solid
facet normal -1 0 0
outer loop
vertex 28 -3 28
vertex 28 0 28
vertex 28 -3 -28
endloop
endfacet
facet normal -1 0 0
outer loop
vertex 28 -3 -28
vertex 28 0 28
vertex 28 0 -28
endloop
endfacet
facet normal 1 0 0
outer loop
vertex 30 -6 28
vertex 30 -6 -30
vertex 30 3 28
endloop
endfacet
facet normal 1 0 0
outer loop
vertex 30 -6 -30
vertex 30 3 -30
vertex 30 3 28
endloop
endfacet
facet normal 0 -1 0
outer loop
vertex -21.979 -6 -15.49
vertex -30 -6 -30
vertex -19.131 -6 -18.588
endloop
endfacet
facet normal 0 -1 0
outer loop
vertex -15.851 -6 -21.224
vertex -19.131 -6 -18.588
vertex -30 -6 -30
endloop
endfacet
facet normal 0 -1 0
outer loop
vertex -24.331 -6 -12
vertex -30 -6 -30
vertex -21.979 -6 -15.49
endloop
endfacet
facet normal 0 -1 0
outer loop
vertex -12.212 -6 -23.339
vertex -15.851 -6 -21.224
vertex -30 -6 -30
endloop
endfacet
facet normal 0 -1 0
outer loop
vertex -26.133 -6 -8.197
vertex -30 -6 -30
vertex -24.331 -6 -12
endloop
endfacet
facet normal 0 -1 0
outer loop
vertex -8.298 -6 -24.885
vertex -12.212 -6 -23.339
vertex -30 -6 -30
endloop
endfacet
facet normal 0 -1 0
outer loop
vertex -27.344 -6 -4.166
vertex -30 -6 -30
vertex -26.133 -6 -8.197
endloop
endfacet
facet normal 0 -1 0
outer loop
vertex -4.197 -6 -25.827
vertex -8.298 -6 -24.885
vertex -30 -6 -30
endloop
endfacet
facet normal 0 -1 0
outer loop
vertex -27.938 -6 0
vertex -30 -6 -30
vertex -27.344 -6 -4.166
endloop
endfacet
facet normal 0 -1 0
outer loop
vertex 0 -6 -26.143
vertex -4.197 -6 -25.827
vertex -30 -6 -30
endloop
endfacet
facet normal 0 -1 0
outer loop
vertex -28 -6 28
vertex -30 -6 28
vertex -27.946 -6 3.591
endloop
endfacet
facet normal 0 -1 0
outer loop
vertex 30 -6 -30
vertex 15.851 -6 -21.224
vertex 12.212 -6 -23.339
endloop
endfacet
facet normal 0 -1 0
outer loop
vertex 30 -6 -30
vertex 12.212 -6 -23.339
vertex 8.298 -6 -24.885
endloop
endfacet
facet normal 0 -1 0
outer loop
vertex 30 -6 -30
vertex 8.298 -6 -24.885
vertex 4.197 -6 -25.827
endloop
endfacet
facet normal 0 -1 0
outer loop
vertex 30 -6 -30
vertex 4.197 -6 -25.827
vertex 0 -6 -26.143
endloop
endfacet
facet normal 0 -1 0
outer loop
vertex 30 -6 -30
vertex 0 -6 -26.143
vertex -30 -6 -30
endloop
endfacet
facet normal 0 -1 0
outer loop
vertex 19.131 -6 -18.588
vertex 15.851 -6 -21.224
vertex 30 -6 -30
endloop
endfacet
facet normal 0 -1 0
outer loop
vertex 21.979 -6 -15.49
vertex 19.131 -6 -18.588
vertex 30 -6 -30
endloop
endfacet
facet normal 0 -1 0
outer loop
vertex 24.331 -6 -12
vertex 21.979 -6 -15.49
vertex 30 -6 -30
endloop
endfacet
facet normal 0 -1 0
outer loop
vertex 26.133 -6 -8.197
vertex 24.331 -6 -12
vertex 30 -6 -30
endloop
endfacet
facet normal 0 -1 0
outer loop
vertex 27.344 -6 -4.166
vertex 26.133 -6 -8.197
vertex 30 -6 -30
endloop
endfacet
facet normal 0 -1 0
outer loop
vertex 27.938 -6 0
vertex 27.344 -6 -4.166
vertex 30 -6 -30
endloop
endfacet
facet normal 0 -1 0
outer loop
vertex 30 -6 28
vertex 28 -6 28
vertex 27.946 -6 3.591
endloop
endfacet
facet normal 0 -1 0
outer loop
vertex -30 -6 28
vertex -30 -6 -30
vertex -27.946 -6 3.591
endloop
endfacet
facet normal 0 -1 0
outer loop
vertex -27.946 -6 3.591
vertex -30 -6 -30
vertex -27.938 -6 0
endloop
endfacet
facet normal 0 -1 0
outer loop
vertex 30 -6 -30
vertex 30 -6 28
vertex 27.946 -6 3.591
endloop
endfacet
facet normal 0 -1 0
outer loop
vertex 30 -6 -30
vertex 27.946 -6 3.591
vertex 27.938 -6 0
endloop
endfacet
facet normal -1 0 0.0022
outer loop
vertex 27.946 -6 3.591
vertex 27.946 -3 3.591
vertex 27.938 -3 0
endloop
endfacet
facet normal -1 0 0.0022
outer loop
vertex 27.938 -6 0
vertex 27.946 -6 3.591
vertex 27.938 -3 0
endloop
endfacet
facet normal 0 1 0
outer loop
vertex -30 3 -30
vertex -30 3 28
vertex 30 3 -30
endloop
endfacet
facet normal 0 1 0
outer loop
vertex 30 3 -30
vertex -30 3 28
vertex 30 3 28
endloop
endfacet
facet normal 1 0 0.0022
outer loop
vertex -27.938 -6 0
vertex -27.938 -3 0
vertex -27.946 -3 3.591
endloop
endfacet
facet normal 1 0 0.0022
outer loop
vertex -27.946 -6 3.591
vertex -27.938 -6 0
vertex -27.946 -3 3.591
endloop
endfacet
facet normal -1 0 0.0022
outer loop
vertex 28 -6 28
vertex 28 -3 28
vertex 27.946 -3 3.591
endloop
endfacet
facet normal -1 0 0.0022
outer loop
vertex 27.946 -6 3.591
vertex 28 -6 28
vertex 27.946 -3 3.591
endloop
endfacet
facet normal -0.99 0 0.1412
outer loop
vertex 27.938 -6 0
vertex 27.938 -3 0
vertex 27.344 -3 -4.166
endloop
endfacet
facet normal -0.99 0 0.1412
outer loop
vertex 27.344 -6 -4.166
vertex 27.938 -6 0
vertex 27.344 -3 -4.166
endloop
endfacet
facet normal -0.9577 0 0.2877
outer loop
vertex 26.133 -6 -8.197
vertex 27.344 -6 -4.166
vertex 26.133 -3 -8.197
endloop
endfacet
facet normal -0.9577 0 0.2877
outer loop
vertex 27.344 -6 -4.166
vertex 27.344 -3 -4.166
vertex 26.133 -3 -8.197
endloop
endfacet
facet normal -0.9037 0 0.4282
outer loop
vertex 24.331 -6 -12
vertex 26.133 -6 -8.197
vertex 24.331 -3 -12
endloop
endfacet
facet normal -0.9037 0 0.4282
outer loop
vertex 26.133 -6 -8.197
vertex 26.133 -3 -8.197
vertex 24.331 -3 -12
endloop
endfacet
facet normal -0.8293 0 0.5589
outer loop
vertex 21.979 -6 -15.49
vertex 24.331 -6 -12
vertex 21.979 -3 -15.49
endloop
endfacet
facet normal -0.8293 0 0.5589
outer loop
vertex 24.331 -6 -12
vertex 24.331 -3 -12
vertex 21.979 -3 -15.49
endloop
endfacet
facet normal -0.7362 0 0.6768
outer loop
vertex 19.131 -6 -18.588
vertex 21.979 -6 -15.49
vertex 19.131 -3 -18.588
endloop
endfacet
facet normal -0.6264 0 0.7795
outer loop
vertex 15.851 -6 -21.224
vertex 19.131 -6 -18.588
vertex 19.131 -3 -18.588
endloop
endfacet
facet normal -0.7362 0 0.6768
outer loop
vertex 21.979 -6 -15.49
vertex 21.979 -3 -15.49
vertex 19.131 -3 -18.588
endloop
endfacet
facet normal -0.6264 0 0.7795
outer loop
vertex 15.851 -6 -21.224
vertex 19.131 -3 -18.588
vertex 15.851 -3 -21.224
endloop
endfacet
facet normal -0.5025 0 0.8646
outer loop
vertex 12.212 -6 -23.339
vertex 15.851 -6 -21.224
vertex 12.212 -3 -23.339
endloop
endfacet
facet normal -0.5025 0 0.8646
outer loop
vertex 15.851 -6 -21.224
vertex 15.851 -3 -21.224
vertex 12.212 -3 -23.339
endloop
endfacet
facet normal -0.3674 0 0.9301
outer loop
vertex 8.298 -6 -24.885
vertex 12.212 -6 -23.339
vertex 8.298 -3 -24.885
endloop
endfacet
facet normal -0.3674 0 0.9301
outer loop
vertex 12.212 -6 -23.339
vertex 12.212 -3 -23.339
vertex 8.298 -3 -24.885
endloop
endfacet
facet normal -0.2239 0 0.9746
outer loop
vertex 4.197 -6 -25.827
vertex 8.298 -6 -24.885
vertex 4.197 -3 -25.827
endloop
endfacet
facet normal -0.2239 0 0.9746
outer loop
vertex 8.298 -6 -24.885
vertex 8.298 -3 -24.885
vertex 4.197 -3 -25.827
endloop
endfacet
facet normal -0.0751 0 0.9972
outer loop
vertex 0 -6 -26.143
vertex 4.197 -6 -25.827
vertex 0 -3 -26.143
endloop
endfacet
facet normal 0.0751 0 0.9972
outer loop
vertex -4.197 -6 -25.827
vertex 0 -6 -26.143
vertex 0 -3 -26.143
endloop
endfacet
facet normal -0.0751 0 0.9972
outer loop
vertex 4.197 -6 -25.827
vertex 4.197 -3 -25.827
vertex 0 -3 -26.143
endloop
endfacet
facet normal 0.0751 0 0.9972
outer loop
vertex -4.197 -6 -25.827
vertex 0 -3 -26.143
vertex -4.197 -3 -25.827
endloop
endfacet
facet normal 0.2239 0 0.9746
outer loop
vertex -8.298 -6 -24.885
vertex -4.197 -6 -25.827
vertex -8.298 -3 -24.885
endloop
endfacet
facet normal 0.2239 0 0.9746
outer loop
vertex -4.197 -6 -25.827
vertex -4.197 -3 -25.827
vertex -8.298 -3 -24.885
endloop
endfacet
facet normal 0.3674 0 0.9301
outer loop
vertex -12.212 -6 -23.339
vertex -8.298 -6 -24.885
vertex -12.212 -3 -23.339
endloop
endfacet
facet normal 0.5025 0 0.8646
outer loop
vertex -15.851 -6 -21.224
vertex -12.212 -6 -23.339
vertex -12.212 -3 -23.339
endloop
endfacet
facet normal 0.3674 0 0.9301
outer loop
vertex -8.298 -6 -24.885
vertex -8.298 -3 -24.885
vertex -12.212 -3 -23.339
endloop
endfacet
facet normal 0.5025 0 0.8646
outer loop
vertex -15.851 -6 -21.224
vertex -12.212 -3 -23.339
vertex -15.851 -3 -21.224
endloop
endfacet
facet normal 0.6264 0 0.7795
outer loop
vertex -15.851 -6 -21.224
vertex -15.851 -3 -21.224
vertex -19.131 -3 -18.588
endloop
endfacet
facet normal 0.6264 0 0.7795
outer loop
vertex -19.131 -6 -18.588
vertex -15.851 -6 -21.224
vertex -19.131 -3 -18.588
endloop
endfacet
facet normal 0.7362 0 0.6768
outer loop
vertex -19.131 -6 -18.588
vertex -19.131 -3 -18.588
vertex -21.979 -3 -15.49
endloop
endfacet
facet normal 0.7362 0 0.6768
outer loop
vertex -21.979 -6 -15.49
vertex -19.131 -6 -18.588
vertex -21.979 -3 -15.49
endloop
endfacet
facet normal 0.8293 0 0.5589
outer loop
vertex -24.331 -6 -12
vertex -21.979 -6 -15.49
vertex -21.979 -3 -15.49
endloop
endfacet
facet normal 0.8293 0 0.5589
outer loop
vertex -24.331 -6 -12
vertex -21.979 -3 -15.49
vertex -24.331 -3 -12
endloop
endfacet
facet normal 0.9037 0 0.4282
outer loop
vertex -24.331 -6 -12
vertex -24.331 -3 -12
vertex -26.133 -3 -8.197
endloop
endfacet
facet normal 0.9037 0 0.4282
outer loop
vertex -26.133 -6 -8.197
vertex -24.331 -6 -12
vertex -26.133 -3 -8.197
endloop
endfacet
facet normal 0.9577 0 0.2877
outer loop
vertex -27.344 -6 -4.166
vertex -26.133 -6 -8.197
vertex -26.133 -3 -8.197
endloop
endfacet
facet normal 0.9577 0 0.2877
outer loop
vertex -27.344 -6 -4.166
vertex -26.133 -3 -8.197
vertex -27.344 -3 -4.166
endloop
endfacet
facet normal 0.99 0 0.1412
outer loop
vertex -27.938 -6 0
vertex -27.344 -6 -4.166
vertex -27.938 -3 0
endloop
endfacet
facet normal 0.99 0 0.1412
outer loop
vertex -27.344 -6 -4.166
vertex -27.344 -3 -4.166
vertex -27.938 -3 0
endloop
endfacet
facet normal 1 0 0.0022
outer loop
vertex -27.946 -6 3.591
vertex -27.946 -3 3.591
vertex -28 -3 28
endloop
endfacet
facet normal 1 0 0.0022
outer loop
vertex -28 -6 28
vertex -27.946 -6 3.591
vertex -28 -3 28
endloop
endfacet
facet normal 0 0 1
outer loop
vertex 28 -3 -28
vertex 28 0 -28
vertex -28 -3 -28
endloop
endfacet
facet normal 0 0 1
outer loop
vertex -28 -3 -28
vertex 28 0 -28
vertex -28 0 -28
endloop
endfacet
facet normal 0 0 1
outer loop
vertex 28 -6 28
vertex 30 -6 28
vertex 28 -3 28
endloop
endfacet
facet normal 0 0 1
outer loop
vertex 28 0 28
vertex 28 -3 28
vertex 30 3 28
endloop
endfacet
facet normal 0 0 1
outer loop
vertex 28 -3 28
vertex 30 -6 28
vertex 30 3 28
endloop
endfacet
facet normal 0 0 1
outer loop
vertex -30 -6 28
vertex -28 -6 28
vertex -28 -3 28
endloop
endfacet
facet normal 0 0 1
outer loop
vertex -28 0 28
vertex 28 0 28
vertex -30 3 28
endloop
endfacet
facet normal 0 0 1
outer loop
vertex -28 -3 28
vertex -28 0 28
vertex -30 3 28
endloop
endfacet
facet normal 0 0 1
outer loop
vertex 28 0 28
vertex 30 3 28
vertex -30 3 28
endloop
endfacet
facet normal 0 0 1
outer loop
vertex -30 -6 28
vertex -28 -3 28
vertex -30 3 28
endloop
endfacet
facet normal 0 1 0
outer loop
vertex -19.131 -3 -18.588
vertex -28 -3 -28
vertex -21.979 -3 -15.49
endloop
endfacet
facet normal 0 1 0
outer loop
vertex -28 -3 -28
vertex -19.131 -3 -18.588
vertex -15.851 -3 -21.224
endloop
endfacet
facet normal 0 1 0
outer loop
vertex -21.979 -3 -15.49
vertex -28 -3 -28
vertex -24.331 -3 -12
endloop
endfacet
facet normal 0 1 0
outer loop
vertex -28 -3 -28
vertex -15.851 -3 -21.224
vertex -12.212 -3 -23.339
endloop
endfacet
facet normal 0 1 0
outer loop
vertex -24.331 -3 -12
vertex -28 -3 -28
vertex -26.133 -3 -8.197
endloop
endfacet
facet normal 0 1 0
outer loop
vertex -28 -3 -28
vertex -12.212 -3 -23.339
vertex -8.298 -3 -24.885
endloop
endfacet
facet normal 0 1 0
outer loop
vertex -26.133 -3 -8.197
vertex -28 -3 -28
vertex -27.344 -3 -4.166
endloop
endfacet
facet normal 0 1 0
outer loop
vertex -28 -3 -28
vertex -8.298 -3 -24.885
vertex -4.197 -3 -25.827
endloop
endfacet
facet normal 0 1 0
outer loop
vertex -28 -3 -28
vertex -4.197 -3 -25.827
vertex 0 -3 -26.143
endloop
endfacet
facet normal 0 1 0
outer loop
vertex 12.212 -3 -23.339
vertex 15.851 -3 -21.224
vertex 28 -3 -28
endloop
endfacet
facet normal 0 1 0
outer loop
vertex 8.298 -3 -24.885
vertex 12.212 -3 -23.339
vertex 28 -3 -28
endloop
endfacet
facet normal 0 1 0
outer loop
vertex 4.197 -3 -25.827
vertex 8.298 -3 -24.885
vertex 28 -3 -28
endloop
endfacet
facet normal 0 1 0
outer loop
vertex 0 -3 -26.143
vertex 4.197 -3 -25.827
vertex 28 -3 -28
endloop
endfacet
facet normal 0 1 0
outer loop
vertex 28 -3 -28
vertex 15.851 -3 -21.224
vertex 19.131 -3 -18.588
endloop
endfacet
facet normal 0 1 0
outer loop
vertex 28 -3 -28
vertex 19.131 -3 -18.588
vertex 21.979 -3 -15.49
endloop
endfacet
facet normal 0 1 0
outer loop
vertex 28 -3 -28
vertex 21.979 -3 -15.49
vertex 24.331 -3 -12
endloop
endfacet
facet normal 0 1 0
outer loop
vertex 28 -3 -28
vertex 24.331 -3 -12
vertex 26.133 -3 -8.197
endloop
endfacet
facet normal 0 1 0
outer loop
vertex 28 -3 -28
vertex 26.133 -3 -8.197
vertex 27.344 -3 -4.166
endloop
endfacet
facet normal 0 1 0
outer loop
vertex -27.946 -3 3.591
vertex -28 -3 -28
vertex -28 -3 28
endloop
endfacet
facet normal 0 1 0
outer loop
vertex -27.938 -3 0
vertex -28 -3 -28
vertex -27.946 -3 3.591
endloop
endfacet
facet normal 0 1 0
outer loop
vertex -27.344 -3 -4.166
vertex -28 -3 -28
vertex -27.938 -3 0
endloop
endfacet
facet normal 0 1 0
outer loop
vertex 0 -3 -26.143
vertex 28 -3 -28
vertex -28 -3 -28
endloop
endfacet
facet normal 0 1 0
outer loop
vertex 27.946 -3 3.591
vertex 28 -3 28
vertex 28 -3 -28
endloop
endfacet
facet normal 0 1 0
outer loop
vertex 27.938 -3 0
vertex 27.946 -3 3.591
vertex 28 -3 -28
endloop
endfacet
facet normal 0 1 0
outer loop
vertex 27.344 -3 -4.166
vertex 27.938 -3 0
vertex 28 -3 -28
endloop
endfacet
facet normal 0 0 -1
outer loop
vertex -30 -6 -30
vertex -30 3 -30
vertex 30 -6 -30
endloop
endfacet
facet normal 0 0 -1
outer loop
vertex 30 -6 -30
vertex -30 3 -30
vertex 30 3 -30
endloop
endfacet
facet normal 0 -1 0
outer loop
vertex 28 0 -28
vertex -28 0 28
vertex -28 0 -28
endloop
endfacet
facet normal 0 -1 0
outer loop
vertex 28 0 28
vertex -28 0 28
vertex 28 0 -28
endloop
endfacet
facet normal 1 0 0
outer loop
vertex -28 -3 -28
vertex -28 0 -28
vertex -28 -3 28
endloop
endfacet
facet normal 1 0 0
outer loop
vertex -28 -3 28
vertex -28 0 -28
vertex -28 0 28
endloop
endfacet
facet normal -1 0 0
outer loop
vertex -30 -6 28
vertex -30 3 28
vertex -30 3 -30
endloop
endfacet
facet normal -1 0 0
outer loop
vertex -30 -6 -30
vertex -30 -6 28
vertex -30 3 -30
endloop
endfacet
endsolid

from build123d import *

# Parameters (mm, degrees)
F0_W     = 60
F0_H     = 58
F1_DEPTH = 3
F4_DEPTH = 3
F6_DEPTH = 3


with BuildPart() as f1:
    # F0 (on Front) → F1 (new body)
    with BuildSketch(Plane.XZ):
        with Locations((0, -1)):
            Rectangle(F0_W, F0_H)
    extrude(amount=-F1_DEPTH)

    # F3 (on face) → F4 (join)
    with BuildSketch(Plane.XZ):
        Polygon((28, -28), (-28, -28), (-28, 28), (-30, 28), (-30, -30), (30, -30), (30, 28), (28, 28), align=None)
    extrude(amount=F4_DEPTH)

    # F5 (on face) → F6 (join)
    with BuildSketch(Plane.XZ.offset(3)):
        with BuildLine():
            Line((-30, 28), (-30, -30))
            Line((-30, -30), (30, -30))
            Line((30, -30), (30, 28))
            Line((30, 28), (28, 28))
            Line((28, 28), (27.9462553992, 3.5910797608))
            ThreePointArc((27.9462553992, 3.5910797608), (27.9999321267, 1.7954129877), (27.9383484068, 0))
            ThreePointArc((27.9383484068, 0), (0, -26.1429355685), (-27.9383484068, 0))
            ThreePointArc((-27.9383484068, 0), (-27.9999321267, 1.7954129877), (-27.9462553992, 3.5910797608))
            Line((-27.9462553992, 3.5910797608), (-28, 28))
            Line((-28, 28), (-30, 28))
        make_face()
        with BuildLine():
            Line((-27.9383484068, 0), (-27.9462553992, 3.5910797608))
            ThreePointArc((-27.9462553992, 3.5910797608), (-27.9999321267, 1.7954129877), (-27.9383484068, 0))
        make_face()
        with BuildLine():
            ThreePointArc((27.9383484068, 0), (27.9999321267, 1.7954129877), (27.9462553992, 3.5910797608))
            Line((27.9462553992, 3.5910797608), (27.9383484068, 0))
        make_face()
    extrude(amount=F6_DEPTH)


solid = f1.part
